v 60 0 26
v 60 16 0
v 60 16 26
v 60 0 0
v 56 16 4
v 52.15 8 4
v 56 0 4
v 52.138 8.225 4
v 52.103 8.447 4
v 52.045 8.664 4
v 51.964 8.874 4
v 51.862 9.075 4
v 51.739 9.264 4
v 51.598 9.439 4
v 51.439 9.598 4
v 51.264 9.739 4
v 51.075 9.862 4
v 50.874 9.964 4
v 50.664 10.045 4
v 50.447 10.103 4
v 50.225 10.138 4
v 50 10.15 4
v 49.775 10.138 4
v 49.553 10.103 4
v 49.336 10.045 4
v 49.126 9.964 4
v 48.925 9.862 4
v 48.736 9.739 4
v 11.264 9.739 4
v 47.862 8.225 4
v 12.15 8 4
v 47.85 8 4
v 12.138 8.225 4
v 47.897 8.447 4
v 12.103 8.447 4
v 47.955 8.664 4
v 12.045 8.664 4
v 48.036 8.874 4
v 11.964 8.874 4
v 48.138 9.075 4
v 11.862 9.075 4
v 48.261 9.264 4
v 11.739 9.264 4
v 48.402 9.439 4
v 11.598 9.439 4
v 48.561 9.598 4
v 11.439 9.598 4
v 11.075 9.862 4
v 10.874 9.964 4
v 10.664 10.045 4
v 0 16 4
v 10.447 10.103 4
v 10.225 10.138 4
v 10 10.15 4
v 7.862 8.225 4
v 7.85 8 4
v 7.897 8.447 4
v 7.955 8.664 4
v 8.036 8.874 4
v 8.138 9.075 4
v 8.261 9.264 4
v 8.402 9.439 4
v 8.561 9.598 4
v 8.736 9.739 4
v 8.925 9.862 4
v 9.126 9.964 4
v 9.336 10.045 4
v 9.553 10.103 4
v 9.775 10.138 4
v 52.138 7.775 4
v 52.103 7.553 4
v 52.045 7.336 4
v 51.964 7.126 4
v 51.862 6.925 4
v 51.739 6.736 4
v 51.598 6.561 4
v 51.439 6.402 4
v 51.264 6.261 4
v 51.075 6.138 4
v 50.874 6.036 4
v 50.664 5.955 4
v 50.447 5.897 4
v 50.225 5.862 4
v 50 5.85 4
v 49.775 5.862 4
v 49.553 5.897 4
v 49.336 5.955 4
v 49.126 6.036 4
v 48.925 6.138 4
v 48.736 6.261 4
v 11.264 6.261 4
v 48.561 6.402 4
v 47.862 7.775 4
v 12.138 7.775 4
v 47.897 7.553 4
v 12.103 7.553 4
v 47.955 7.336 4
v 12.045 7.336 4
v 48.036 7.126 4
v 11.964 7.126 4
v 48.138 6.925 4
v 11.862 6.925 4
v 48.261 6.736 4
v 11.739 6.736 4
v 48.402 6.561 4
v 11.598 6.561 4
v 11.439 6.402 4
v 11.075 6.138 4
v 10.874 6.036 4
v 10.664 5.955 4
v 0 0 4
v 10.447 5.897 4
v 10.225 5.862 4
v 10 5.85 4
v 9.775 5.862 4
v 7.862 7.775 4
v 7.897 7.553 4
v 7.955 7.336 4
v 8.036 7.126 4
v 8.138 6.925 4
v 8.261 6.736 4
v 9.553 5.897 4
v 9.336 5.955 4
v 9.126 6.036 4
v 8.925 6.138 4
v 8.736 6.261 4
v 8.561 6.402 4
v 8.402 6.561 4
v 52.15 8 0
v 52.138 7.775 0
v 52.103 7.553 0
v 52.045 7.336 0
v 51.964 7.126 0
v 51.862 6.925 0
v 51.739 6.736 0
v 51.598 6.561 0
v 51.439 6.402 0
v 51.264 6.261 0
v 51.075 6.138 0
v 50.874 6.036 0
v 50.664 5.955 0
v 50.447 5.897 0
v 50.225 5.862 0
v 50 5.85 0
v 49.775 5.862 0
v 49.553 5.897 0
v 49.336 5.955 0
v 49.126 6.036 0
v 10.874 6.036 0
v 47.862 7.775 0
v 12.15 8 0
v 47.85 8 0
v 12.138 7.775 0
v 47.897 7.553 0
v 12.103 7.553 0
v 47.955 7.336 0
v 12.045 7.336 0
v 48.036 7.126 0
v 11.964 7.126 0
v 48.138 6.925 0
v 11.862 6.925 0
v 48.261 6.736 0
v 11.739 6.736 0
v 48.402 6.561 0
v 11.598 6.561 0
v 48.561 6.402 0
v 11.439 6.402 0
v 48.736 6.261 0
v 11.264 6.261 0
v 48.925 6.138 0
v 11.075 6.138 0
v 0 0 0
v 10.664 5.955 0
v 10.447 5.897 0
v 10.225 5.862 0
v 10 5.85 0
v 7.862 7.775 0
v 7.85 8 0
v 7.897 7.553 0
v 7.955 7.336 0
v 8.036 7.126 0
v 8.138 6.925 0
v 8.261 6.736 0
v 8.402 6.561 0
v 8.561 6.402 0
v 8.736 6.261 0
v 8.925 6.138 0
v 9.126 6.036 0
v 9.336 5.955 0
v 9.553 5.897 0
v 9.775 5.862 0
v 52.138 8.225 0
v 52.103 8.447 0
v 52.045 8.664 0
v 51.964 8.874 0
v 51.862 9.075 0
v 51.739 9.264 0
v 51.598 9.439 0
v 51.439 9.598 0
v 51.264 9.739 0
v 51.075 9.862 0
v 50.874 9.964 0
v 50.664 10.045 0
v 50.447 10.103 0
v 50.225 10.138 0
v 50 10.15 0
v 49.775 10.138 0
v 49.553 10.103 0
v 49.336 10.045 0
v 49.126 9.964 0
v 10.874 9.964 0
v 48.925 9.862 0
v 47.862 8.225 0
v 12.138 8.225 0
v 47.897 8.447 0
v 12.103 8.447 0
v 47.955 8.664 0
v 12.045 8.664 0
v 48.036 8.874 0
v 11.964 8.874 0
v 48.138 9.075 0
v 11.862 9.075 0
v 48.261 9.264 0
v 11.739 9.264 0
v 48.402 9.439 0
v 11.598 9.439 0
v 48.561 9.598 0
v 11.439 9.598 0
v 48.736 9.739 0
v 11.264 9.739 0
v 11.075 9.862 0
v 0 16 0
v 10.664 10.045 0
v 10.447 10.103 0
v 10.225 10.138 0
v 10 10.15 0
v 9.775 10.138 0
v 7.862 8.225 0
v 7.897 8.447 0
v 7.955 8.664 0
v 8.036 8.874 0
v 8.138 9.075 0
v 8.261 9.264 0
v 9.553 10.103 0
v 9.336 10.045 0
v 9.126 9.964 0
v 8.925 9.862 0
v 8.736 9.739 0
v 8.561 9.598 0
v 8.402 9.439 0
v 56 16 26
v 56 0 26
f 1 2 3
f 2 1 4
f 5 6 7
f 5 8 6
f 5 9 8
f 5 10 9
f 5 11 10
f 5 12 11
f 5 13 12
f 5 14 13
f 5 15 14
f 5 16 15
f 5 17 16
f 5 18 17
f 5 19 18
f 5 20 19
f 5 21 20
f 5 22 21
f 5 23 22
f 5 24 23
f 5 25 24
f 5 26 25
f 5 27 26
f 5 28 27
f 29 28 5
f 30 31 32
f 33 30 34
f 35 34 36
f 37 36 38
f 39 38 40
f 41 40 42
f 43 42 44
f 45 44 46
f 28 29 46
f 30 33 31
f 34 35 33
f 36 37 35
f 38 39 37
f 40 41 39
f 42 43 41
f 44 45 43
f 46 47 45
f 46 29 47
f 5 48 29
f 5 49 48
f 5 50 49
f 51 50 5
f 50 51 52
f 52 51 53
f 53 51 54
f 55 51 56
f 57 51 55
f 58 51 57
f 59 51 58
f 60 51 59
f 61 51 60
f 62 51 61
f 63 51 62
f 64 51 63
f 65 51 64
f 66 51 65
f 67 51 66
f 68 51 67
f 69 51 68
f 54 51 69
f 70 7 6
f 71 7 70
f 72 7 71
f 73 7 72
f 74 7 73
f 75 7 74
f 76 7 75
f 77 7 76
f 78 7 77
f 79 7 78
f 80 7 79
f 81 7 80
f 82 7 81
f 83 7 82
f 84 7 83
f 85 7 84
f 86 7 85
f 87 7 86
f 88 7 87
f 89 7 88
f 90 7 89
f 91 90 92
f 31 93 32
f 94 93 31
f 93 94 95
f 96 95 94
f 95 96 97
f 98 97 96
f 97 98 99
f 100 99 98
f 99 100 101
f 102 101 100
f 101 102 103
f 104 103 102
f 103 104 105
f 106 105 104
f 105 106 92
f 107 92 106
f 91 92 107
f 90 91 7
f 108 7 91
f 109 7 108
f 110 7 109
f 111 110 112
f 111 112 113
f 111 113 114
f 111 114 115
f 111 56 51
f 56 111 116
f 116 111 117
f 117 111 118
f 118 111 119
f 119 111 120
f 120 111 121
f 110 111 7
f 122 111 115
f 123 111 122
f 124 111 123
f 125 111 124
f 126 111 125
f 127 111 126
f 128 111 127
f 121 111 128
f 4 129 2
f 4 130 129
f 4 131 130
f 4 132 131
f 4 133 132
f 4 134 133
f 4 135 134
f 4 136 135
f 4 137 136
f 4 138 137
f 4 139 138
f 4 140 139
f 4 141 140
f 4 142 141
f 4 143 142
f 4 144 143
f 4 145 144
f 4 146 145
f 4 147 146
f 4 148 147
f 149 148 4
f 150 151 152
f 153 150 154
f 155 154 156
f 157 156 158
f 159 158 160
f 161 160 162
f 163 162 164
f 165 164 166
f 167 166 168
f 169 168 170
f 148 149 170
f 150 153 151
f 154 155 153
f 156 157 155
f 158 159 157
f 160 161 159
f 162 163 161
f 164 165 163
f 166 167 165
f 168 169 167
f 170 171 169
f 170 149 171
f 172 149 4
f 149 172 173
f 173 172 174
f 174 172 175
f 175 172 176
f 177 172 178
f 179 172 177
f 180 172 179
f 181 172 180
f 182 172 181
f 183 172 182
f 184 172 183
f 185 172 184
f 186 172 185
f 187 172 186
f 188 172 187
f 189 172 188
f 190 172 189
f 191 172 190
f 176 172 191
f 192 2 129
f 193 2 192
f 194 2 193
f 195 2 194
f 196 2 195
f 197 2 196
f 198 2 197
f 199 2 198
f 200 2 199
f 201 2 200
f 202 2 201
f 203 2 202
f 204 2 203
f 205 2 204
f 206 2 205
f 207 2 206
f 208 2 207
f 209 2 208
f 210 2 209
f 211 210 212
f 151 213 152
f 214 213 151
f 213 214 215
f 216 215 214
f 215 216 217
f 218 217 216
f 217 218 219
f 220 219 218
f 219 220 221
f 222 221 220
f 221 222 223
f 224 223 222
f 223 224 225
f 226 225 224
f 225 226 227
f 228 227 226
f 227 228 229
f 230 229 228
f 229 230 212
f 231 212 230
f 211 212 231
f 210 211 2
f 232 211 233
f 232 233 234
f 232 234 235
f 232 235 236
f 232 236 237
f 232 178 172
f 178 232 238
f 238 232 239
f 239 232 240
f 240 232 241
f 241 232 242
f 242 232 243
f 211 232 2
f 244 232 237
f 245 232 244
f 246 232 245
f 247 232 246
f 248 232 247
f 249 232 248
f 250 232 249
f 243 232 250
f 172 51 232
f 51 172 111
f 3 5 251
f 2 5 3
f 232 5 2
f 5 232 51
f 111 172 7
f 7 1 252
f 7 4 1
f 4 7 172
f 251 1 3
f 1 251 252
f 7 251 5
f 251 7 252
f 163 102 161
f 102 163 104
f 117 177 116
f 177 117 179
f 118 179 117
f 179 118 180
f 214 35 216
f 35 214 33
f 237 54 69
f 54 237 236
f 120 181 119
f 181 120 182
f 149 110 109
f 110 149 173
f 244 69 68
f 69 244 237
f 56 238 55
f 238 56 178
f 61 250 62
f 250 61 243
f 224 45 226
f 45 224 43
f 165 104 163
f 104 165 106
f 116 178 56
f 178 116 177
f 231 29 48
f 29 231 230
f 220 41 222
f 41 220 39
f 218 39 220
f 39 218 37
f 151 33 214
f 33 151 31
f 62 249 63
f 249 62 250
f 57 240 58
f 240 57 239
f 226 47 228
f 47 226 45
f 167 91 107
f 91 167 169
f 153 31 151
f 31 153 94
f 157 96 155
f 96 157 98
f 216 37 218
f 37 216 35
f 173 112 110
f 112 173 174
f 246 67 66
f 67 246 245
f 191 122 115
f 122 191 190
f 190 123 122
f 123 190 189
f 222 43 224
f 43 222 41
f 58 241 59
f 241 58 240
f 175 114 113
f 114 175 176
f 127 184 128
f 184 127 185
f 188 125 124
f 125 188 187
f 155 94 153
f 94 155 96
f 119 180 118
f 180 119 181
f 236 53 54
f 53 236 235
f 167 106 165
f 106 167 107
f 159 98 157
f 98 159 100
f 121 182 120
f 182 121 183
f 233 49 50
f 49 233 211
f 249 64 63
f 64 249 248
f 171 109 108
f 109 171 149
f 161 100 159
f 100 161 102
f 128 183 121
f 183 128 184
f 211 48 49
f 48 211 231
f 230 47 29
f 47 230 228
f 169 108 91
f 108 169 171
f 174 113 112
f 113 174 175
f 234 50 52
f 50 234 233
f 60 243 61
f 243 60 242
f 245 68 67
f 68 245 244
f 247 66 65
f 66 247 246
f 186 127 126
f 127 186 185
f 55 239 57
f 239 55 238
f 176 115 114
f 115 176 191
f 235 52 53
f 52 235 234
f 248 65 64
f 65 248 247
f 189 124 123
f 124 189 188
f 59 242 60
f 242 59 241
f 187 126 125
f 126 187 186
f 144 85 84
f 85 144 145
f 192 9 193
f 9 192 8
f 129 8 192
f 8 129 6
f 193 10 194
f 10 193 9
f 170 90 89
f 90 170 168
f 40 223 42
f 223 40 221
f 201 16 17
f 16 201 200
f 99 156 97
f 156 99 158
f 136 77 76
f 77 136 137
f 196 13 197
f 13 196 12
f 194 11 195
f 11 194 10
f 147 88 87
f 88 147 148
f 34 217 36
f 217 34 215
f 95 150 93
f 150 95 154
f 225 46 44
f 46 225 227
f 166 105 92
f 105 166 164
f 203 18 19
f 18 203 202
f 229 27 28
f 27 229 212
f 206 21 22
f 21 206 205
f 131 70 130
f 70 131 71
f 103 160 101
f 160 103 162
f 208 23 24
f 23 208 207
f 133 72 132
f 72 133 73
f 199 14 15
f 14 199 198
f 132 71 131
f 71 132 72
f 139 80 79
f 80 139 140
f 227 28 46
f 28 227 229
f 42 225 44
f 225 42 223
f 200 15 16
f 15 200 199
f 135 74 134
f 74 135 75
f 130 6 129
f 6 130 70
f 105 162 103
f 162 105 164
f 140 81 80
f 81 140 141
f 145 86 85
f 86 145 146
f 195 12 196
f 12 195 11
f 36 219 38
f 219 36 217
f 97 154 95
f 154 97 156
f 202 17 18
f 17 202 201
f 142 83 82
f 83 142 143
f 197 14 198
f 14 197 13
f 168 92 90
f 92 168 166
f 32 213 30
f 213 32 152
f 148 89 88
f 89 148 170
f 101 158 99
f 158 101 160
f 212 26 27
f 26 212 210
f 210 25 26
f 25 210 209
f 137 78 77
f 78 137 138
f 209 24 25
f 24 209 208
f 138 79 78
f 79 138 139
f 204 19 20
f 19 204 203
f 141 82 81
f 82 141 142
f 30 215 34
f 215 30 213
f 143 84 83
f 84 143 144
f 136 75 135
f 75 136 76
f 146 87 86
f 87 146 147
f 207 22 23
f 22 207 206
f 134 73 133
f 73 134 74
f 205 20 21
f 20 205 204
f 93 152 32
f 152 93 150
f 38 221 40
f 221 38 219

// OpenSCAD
// Latch hook bracket.
$fn = 60;
eps = 0.02;
length = 60;
height = 22;
width = 16;
thickness = 4;
difference() { union() { cube([length,width,thickness]); translate([length-thickness,0,thickness]) cube([thickness,width,height]); } for(x=[10,length-10]) translate([x,width/2,-eps]) cylinder(d=4.3,h=thickness+2*eps); }
